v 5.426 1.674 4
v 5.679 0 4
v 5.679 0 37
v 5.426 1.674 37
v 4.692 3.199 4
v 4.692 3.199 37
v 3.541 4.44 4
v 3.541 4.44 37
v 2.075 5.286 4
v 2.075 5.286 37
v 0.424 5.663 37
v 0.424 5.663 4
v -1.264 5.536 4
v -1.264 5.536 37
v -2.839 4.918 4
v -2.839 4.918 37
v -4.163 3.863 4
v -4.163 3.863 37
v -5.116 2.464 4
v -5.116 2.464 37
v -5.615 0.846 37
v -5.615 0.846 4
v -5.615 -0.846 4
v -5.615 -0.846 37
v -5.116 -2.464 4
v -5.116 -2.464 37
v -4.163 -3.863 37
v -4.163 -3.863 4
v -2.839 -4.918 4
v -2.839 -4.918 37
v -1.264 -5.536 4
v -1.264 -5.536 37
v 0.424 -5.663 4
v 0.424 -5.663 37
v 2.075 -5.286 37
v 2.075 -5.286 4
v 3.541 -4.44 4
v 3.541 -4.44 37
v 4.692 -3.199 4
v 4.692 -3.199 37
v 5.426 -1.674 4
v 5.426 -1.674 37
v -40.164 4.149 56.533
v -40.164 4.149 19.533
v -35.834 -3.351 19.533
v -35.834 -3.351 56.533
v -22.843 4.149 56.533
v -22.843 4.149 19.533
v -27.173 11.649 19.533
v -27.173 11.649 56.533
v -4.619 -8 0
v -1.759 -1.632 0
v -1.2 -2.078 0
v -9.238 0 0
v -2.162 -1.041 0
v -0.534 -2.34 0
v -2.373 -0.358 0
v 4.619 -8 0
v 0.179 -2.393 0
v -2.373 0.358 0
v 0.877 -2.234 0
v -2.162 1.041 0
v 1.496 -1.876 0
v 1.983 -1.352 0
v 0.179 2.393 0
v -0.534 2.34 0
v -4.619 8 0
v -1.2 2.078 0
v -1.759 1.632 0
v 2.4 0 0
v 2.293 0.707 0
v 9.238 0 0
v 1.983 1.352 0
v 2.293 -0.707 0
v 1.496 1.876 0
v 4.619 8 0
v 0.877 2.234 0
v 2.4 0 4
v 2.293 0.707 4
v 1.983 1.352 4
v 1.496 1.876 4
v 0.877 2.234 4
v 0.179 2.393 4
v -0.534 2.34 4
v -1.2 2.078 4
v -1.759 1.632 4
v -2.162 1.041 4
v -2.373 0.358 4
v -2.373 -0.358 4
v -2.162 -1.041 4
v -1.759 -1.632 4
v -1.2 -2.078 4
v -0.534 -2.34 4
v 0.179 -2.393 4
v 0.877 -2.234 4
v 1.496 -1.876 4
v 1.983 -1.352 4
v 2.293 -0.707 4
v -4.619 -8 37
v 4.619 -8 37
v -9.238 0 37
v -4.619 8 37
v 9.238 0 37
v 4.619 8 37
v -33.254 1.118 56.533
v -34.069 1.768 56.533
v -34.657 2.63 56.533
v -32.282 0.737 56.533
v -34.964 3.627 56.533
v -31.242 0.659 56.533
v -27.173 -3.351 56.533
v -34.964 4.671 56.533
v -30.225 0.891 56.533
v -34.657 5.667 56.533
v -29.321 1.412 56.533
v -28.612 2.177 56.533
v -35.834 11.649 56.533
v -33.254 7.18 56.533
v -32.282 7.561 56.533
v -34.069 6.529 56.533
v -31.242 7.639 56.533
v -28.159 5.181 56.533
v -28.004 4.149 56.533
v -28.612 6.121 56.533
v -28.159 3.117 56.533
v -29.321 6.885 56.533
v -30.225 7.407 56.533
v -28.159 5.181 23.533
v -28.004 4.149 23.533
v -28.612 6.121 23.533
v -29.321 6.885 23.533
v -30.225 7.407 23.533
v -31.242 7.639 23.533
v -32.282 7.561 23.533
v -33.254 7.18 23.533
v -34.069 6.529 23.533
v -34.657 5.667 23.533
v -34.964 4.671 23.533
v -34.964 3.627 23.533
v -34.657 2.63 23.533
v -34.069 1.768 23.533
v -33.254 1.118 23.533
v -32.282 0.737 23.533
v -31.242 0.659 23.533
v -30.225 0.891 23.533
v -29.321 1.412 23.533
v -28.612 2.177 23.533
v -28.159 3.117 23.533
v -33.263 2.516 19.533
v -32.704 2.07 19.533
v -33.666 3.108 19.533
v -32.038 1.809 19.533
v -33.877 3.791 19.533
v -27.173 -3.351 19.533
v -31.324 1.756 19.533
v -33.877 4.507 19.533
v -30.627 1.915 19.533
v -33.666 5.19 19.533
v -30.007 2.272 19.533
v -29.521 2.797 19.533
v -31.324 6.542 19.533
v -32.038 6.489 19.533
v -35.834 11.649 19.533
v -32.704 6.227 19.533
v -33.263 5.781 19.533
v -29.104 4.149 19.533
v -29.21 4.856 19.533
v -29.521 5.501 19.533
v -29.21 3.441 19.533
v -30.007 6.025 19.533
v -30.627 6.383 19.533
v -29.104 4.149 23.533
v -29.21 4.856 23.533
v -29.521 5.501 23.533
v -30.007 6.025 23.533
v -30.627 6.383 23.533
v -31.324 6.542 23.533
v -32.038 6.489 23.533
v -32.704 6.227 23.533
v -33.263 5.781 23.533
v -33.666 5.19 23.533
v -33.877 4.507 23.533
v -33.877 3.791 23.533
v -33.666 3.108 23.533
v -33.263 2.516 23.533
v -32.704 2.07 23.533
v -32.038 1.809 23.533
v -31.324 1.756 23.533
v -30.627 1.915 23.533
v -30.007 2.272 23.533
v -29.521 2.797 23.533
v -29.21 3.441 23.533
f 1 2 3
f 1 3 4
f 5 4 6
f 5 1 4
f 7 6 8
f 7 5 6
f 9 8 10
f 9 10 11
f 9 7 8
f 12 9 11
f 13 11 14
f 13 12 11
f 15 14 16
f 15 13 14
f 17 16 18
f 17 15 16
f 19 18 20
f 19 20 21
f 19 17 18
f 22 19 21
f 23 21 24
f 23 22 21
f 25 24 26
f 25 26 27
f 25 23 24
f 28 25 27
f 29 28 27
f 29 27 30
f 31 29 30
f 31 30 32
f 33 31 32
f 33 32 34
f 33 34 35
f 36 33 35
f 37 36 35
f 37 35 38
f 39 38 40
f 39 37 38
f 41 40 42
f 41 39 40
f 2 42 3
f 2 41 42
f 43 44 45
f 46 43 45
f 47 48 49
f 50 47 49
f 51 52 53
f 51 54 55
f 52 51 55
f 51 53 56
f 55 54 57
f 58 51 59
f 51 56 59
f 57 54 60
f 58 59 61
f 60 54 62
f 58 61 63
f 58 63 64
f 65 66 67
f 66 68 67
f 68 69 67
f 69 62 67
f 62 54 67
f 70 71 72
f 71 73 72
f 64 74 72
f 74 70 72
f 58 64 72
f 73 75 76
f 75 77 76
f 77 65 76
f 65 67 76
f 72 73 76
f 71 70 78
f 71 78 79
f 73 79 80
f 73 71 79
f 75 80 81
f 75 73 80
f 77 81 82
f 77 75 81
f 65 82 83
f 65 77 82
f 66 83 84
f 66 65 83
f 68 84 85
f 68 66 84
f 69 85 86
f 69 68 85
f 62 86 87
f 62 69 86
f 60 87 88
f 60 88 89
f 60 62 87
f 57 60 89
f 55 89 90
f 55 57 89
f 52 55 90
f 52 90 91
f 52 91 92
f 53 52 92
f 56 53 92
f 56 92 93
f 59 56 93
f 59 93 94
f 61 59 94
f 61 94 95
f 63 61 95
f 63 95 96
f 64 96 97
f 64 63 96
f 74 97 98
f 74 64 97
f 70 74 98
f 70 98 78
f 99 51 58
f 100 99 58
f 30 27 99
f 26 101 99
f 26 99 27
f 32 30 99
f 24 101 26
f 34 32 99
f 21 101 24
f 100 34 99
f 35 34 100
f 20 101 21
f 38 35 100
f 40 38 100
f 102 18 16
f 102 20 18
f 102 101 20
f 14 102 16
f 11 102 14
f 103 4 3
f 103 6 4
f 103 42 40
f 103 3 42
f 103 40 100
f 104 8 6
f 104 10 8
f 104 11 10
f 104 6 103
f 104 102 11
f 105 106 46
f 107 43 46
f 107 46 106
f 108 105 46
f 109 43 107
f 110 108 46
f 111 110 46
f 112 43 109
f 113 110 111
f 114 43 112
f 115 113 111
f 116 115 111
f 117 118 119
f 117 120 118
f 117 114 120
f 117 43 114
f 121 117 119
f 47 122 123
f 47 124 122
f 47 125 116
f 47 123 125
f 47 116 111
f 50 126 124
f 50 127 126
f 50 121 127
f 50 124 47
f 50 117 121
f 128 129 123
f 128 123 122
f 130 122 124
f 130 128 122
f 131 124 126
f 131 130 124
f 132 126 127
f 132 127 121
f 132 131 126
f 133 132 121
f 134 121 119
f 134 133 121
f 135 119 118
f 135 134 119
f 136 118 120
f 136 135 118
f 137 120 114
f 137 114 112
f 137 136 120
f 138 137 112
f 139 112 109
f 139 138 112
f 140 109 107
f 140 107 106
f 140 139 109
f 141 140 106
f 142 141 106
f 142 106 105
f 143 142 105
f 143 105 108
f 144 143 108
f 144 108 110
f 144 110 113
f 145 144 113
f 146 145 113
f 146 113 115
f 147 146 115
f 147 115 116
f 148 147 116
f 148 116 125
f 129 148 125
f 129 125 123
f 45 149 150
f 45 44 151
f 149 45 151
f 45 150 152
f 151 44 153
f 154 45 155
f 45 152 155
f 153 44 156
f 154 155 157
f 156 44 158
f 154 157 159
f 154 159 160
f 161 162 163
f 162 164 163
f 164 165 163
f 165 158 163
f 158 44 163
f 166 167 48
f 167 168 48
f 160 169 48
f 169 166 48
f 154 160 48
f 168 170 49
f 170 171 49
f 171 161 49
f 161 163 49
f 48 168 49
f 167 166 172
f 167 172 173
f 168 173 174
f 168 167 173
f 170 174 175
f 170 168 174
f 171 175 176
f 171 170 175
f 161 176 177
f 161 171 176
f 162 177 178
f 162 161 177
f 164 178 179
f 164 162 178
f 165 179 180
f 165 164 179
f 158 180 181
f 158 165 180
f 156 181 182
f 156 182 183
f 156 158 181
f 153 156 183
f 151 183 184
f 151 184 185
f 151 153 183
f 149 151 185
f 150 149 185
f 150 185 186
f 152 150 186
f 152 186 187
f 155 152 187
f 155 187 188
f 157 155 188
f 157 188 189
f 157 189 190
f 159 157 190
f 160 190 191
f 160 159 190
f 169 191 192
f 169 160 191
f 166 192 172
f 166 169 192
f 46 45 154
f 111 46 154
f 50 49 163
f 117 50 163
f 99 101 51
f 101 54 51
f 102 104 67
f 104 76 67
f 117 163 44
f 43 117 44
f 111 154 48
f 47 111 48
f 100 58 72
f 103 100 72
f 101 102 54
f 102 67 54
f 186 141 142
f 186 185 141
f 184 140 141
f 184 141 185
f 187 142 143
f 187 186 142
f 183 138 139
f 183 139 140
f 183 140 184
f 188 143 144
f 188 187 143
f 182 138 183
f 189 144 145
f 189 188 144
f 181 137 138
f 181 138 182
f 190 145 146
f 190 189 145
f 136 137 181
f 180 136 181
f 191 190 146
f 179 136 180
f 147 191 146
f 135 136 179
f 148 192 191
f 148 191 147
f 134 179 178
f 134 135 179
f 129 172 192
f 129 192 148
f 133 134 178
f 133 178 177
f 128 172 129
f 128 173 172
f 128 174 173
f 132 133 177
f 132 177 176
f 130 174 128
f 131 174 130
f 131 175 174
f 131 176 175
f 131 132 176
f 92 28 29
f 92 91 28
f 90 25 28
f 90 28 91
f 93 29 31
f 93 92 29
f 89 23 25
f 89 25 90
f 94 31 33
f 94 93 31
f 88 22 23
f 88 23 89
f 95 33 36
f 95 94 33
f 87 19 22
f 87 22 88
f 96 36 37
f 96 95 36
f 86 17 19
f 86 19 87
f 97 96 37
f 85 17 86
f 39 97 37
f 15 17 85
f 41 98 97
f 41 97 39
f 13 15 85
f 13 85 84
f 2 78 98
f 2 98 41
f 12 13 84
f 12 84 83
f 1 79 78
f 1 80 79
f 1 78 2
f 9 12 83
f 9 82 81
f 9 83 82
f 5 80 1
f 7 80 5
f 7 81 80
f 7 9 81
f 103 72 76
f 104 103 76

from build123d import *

# Parameters (mm, degrees)
SKETCH1_R              = 2.4
BOSS_EXTRUDE1_DEPTH    = 4
SKETCH2_R              = 5.678751563
BOSS_EXTRUDE2_DEPTH    = 33
DETECTOR_START         = 19.533020459
DETECTOR_OUTLINE_R     = 3.5
DETECTOR_DEPTH         = 37
DETECTOR_2_OUTLINE_R   = 3.5
DETECTOR_2_OUTLINE_R_2 = 2.4
DETECTOR_2_DEPTH       = 4


# Read off the part's stored shape, not the designer's step: detector
with BuildPart() as part:
    # Sketch1 → Boss-Extrude1 (new body)
    with BuildSketch(Plane.XY):
        Polygon((9.237604307, 0), (4.618802154, 8), (-4.618802154, 8), (-9.237604307, 0), (-4.618802154, -8), (4.618802154, -8), align=None)
        Circle(SKETCH1_R, mode=Mode.SUBTRACT)
    extrude(amount=BOSS_EXTRUDE1_DEPTH)

    # Sketch2 → Boss-Extrude2 (add)
    with BuildSketch(Plane.XY.offset(4)):
        Polygon((9.237604307, 0), (4.618802154, 8), (-4.618802154, 8), (-9.237604307, 0), (-4.618802154, -8), (4.618802154, -8), align=None)
        Circle(SKETCH2_R, mode=Mode.SUBTRACT)
    extrude(amount=BOSS_EXTRUDE2_DEPTH)


with BuildPart() as body_2:
    # detector outline → detector (new body)
    with BuildSketch(Plane.XY.offset(DETECTOR_START)):
        Polygon((-35.833674913, 11.648881449), (-40.163801932, 4.148881449), (-35.833674913, -3.351118551), (-27.173420875, -3.351118551), (-22.843293856, 4.148881449), (-27.173420875, 11.648881449), align=None)
        with Locations((-31.503547894, 4.148881449)):
            Circle(DETECTOR_OUTLINE_R, mode=Mode.SUBTRACT)
    extrude(amount=DETECTOR_DEPTH)

    # detector 2 outline → detector 2 (add)
    with BuildSketch(Plane.XY.offset(DETECTOR_START)):
        with Locations((-31.503547894, 4.148881449)):
            Circle(DETECTOR_2_OUTLINE_R)
        with Locations((-31.503547894, 4.148881449)):
            Circle(DETECTOR_2_OUTLINE_R_2, mode=Mode.SUBTRACT)
    extrude(amount=DETECTOR_2_DEPTH)


solid = Compound([part.part, body_2.part])
